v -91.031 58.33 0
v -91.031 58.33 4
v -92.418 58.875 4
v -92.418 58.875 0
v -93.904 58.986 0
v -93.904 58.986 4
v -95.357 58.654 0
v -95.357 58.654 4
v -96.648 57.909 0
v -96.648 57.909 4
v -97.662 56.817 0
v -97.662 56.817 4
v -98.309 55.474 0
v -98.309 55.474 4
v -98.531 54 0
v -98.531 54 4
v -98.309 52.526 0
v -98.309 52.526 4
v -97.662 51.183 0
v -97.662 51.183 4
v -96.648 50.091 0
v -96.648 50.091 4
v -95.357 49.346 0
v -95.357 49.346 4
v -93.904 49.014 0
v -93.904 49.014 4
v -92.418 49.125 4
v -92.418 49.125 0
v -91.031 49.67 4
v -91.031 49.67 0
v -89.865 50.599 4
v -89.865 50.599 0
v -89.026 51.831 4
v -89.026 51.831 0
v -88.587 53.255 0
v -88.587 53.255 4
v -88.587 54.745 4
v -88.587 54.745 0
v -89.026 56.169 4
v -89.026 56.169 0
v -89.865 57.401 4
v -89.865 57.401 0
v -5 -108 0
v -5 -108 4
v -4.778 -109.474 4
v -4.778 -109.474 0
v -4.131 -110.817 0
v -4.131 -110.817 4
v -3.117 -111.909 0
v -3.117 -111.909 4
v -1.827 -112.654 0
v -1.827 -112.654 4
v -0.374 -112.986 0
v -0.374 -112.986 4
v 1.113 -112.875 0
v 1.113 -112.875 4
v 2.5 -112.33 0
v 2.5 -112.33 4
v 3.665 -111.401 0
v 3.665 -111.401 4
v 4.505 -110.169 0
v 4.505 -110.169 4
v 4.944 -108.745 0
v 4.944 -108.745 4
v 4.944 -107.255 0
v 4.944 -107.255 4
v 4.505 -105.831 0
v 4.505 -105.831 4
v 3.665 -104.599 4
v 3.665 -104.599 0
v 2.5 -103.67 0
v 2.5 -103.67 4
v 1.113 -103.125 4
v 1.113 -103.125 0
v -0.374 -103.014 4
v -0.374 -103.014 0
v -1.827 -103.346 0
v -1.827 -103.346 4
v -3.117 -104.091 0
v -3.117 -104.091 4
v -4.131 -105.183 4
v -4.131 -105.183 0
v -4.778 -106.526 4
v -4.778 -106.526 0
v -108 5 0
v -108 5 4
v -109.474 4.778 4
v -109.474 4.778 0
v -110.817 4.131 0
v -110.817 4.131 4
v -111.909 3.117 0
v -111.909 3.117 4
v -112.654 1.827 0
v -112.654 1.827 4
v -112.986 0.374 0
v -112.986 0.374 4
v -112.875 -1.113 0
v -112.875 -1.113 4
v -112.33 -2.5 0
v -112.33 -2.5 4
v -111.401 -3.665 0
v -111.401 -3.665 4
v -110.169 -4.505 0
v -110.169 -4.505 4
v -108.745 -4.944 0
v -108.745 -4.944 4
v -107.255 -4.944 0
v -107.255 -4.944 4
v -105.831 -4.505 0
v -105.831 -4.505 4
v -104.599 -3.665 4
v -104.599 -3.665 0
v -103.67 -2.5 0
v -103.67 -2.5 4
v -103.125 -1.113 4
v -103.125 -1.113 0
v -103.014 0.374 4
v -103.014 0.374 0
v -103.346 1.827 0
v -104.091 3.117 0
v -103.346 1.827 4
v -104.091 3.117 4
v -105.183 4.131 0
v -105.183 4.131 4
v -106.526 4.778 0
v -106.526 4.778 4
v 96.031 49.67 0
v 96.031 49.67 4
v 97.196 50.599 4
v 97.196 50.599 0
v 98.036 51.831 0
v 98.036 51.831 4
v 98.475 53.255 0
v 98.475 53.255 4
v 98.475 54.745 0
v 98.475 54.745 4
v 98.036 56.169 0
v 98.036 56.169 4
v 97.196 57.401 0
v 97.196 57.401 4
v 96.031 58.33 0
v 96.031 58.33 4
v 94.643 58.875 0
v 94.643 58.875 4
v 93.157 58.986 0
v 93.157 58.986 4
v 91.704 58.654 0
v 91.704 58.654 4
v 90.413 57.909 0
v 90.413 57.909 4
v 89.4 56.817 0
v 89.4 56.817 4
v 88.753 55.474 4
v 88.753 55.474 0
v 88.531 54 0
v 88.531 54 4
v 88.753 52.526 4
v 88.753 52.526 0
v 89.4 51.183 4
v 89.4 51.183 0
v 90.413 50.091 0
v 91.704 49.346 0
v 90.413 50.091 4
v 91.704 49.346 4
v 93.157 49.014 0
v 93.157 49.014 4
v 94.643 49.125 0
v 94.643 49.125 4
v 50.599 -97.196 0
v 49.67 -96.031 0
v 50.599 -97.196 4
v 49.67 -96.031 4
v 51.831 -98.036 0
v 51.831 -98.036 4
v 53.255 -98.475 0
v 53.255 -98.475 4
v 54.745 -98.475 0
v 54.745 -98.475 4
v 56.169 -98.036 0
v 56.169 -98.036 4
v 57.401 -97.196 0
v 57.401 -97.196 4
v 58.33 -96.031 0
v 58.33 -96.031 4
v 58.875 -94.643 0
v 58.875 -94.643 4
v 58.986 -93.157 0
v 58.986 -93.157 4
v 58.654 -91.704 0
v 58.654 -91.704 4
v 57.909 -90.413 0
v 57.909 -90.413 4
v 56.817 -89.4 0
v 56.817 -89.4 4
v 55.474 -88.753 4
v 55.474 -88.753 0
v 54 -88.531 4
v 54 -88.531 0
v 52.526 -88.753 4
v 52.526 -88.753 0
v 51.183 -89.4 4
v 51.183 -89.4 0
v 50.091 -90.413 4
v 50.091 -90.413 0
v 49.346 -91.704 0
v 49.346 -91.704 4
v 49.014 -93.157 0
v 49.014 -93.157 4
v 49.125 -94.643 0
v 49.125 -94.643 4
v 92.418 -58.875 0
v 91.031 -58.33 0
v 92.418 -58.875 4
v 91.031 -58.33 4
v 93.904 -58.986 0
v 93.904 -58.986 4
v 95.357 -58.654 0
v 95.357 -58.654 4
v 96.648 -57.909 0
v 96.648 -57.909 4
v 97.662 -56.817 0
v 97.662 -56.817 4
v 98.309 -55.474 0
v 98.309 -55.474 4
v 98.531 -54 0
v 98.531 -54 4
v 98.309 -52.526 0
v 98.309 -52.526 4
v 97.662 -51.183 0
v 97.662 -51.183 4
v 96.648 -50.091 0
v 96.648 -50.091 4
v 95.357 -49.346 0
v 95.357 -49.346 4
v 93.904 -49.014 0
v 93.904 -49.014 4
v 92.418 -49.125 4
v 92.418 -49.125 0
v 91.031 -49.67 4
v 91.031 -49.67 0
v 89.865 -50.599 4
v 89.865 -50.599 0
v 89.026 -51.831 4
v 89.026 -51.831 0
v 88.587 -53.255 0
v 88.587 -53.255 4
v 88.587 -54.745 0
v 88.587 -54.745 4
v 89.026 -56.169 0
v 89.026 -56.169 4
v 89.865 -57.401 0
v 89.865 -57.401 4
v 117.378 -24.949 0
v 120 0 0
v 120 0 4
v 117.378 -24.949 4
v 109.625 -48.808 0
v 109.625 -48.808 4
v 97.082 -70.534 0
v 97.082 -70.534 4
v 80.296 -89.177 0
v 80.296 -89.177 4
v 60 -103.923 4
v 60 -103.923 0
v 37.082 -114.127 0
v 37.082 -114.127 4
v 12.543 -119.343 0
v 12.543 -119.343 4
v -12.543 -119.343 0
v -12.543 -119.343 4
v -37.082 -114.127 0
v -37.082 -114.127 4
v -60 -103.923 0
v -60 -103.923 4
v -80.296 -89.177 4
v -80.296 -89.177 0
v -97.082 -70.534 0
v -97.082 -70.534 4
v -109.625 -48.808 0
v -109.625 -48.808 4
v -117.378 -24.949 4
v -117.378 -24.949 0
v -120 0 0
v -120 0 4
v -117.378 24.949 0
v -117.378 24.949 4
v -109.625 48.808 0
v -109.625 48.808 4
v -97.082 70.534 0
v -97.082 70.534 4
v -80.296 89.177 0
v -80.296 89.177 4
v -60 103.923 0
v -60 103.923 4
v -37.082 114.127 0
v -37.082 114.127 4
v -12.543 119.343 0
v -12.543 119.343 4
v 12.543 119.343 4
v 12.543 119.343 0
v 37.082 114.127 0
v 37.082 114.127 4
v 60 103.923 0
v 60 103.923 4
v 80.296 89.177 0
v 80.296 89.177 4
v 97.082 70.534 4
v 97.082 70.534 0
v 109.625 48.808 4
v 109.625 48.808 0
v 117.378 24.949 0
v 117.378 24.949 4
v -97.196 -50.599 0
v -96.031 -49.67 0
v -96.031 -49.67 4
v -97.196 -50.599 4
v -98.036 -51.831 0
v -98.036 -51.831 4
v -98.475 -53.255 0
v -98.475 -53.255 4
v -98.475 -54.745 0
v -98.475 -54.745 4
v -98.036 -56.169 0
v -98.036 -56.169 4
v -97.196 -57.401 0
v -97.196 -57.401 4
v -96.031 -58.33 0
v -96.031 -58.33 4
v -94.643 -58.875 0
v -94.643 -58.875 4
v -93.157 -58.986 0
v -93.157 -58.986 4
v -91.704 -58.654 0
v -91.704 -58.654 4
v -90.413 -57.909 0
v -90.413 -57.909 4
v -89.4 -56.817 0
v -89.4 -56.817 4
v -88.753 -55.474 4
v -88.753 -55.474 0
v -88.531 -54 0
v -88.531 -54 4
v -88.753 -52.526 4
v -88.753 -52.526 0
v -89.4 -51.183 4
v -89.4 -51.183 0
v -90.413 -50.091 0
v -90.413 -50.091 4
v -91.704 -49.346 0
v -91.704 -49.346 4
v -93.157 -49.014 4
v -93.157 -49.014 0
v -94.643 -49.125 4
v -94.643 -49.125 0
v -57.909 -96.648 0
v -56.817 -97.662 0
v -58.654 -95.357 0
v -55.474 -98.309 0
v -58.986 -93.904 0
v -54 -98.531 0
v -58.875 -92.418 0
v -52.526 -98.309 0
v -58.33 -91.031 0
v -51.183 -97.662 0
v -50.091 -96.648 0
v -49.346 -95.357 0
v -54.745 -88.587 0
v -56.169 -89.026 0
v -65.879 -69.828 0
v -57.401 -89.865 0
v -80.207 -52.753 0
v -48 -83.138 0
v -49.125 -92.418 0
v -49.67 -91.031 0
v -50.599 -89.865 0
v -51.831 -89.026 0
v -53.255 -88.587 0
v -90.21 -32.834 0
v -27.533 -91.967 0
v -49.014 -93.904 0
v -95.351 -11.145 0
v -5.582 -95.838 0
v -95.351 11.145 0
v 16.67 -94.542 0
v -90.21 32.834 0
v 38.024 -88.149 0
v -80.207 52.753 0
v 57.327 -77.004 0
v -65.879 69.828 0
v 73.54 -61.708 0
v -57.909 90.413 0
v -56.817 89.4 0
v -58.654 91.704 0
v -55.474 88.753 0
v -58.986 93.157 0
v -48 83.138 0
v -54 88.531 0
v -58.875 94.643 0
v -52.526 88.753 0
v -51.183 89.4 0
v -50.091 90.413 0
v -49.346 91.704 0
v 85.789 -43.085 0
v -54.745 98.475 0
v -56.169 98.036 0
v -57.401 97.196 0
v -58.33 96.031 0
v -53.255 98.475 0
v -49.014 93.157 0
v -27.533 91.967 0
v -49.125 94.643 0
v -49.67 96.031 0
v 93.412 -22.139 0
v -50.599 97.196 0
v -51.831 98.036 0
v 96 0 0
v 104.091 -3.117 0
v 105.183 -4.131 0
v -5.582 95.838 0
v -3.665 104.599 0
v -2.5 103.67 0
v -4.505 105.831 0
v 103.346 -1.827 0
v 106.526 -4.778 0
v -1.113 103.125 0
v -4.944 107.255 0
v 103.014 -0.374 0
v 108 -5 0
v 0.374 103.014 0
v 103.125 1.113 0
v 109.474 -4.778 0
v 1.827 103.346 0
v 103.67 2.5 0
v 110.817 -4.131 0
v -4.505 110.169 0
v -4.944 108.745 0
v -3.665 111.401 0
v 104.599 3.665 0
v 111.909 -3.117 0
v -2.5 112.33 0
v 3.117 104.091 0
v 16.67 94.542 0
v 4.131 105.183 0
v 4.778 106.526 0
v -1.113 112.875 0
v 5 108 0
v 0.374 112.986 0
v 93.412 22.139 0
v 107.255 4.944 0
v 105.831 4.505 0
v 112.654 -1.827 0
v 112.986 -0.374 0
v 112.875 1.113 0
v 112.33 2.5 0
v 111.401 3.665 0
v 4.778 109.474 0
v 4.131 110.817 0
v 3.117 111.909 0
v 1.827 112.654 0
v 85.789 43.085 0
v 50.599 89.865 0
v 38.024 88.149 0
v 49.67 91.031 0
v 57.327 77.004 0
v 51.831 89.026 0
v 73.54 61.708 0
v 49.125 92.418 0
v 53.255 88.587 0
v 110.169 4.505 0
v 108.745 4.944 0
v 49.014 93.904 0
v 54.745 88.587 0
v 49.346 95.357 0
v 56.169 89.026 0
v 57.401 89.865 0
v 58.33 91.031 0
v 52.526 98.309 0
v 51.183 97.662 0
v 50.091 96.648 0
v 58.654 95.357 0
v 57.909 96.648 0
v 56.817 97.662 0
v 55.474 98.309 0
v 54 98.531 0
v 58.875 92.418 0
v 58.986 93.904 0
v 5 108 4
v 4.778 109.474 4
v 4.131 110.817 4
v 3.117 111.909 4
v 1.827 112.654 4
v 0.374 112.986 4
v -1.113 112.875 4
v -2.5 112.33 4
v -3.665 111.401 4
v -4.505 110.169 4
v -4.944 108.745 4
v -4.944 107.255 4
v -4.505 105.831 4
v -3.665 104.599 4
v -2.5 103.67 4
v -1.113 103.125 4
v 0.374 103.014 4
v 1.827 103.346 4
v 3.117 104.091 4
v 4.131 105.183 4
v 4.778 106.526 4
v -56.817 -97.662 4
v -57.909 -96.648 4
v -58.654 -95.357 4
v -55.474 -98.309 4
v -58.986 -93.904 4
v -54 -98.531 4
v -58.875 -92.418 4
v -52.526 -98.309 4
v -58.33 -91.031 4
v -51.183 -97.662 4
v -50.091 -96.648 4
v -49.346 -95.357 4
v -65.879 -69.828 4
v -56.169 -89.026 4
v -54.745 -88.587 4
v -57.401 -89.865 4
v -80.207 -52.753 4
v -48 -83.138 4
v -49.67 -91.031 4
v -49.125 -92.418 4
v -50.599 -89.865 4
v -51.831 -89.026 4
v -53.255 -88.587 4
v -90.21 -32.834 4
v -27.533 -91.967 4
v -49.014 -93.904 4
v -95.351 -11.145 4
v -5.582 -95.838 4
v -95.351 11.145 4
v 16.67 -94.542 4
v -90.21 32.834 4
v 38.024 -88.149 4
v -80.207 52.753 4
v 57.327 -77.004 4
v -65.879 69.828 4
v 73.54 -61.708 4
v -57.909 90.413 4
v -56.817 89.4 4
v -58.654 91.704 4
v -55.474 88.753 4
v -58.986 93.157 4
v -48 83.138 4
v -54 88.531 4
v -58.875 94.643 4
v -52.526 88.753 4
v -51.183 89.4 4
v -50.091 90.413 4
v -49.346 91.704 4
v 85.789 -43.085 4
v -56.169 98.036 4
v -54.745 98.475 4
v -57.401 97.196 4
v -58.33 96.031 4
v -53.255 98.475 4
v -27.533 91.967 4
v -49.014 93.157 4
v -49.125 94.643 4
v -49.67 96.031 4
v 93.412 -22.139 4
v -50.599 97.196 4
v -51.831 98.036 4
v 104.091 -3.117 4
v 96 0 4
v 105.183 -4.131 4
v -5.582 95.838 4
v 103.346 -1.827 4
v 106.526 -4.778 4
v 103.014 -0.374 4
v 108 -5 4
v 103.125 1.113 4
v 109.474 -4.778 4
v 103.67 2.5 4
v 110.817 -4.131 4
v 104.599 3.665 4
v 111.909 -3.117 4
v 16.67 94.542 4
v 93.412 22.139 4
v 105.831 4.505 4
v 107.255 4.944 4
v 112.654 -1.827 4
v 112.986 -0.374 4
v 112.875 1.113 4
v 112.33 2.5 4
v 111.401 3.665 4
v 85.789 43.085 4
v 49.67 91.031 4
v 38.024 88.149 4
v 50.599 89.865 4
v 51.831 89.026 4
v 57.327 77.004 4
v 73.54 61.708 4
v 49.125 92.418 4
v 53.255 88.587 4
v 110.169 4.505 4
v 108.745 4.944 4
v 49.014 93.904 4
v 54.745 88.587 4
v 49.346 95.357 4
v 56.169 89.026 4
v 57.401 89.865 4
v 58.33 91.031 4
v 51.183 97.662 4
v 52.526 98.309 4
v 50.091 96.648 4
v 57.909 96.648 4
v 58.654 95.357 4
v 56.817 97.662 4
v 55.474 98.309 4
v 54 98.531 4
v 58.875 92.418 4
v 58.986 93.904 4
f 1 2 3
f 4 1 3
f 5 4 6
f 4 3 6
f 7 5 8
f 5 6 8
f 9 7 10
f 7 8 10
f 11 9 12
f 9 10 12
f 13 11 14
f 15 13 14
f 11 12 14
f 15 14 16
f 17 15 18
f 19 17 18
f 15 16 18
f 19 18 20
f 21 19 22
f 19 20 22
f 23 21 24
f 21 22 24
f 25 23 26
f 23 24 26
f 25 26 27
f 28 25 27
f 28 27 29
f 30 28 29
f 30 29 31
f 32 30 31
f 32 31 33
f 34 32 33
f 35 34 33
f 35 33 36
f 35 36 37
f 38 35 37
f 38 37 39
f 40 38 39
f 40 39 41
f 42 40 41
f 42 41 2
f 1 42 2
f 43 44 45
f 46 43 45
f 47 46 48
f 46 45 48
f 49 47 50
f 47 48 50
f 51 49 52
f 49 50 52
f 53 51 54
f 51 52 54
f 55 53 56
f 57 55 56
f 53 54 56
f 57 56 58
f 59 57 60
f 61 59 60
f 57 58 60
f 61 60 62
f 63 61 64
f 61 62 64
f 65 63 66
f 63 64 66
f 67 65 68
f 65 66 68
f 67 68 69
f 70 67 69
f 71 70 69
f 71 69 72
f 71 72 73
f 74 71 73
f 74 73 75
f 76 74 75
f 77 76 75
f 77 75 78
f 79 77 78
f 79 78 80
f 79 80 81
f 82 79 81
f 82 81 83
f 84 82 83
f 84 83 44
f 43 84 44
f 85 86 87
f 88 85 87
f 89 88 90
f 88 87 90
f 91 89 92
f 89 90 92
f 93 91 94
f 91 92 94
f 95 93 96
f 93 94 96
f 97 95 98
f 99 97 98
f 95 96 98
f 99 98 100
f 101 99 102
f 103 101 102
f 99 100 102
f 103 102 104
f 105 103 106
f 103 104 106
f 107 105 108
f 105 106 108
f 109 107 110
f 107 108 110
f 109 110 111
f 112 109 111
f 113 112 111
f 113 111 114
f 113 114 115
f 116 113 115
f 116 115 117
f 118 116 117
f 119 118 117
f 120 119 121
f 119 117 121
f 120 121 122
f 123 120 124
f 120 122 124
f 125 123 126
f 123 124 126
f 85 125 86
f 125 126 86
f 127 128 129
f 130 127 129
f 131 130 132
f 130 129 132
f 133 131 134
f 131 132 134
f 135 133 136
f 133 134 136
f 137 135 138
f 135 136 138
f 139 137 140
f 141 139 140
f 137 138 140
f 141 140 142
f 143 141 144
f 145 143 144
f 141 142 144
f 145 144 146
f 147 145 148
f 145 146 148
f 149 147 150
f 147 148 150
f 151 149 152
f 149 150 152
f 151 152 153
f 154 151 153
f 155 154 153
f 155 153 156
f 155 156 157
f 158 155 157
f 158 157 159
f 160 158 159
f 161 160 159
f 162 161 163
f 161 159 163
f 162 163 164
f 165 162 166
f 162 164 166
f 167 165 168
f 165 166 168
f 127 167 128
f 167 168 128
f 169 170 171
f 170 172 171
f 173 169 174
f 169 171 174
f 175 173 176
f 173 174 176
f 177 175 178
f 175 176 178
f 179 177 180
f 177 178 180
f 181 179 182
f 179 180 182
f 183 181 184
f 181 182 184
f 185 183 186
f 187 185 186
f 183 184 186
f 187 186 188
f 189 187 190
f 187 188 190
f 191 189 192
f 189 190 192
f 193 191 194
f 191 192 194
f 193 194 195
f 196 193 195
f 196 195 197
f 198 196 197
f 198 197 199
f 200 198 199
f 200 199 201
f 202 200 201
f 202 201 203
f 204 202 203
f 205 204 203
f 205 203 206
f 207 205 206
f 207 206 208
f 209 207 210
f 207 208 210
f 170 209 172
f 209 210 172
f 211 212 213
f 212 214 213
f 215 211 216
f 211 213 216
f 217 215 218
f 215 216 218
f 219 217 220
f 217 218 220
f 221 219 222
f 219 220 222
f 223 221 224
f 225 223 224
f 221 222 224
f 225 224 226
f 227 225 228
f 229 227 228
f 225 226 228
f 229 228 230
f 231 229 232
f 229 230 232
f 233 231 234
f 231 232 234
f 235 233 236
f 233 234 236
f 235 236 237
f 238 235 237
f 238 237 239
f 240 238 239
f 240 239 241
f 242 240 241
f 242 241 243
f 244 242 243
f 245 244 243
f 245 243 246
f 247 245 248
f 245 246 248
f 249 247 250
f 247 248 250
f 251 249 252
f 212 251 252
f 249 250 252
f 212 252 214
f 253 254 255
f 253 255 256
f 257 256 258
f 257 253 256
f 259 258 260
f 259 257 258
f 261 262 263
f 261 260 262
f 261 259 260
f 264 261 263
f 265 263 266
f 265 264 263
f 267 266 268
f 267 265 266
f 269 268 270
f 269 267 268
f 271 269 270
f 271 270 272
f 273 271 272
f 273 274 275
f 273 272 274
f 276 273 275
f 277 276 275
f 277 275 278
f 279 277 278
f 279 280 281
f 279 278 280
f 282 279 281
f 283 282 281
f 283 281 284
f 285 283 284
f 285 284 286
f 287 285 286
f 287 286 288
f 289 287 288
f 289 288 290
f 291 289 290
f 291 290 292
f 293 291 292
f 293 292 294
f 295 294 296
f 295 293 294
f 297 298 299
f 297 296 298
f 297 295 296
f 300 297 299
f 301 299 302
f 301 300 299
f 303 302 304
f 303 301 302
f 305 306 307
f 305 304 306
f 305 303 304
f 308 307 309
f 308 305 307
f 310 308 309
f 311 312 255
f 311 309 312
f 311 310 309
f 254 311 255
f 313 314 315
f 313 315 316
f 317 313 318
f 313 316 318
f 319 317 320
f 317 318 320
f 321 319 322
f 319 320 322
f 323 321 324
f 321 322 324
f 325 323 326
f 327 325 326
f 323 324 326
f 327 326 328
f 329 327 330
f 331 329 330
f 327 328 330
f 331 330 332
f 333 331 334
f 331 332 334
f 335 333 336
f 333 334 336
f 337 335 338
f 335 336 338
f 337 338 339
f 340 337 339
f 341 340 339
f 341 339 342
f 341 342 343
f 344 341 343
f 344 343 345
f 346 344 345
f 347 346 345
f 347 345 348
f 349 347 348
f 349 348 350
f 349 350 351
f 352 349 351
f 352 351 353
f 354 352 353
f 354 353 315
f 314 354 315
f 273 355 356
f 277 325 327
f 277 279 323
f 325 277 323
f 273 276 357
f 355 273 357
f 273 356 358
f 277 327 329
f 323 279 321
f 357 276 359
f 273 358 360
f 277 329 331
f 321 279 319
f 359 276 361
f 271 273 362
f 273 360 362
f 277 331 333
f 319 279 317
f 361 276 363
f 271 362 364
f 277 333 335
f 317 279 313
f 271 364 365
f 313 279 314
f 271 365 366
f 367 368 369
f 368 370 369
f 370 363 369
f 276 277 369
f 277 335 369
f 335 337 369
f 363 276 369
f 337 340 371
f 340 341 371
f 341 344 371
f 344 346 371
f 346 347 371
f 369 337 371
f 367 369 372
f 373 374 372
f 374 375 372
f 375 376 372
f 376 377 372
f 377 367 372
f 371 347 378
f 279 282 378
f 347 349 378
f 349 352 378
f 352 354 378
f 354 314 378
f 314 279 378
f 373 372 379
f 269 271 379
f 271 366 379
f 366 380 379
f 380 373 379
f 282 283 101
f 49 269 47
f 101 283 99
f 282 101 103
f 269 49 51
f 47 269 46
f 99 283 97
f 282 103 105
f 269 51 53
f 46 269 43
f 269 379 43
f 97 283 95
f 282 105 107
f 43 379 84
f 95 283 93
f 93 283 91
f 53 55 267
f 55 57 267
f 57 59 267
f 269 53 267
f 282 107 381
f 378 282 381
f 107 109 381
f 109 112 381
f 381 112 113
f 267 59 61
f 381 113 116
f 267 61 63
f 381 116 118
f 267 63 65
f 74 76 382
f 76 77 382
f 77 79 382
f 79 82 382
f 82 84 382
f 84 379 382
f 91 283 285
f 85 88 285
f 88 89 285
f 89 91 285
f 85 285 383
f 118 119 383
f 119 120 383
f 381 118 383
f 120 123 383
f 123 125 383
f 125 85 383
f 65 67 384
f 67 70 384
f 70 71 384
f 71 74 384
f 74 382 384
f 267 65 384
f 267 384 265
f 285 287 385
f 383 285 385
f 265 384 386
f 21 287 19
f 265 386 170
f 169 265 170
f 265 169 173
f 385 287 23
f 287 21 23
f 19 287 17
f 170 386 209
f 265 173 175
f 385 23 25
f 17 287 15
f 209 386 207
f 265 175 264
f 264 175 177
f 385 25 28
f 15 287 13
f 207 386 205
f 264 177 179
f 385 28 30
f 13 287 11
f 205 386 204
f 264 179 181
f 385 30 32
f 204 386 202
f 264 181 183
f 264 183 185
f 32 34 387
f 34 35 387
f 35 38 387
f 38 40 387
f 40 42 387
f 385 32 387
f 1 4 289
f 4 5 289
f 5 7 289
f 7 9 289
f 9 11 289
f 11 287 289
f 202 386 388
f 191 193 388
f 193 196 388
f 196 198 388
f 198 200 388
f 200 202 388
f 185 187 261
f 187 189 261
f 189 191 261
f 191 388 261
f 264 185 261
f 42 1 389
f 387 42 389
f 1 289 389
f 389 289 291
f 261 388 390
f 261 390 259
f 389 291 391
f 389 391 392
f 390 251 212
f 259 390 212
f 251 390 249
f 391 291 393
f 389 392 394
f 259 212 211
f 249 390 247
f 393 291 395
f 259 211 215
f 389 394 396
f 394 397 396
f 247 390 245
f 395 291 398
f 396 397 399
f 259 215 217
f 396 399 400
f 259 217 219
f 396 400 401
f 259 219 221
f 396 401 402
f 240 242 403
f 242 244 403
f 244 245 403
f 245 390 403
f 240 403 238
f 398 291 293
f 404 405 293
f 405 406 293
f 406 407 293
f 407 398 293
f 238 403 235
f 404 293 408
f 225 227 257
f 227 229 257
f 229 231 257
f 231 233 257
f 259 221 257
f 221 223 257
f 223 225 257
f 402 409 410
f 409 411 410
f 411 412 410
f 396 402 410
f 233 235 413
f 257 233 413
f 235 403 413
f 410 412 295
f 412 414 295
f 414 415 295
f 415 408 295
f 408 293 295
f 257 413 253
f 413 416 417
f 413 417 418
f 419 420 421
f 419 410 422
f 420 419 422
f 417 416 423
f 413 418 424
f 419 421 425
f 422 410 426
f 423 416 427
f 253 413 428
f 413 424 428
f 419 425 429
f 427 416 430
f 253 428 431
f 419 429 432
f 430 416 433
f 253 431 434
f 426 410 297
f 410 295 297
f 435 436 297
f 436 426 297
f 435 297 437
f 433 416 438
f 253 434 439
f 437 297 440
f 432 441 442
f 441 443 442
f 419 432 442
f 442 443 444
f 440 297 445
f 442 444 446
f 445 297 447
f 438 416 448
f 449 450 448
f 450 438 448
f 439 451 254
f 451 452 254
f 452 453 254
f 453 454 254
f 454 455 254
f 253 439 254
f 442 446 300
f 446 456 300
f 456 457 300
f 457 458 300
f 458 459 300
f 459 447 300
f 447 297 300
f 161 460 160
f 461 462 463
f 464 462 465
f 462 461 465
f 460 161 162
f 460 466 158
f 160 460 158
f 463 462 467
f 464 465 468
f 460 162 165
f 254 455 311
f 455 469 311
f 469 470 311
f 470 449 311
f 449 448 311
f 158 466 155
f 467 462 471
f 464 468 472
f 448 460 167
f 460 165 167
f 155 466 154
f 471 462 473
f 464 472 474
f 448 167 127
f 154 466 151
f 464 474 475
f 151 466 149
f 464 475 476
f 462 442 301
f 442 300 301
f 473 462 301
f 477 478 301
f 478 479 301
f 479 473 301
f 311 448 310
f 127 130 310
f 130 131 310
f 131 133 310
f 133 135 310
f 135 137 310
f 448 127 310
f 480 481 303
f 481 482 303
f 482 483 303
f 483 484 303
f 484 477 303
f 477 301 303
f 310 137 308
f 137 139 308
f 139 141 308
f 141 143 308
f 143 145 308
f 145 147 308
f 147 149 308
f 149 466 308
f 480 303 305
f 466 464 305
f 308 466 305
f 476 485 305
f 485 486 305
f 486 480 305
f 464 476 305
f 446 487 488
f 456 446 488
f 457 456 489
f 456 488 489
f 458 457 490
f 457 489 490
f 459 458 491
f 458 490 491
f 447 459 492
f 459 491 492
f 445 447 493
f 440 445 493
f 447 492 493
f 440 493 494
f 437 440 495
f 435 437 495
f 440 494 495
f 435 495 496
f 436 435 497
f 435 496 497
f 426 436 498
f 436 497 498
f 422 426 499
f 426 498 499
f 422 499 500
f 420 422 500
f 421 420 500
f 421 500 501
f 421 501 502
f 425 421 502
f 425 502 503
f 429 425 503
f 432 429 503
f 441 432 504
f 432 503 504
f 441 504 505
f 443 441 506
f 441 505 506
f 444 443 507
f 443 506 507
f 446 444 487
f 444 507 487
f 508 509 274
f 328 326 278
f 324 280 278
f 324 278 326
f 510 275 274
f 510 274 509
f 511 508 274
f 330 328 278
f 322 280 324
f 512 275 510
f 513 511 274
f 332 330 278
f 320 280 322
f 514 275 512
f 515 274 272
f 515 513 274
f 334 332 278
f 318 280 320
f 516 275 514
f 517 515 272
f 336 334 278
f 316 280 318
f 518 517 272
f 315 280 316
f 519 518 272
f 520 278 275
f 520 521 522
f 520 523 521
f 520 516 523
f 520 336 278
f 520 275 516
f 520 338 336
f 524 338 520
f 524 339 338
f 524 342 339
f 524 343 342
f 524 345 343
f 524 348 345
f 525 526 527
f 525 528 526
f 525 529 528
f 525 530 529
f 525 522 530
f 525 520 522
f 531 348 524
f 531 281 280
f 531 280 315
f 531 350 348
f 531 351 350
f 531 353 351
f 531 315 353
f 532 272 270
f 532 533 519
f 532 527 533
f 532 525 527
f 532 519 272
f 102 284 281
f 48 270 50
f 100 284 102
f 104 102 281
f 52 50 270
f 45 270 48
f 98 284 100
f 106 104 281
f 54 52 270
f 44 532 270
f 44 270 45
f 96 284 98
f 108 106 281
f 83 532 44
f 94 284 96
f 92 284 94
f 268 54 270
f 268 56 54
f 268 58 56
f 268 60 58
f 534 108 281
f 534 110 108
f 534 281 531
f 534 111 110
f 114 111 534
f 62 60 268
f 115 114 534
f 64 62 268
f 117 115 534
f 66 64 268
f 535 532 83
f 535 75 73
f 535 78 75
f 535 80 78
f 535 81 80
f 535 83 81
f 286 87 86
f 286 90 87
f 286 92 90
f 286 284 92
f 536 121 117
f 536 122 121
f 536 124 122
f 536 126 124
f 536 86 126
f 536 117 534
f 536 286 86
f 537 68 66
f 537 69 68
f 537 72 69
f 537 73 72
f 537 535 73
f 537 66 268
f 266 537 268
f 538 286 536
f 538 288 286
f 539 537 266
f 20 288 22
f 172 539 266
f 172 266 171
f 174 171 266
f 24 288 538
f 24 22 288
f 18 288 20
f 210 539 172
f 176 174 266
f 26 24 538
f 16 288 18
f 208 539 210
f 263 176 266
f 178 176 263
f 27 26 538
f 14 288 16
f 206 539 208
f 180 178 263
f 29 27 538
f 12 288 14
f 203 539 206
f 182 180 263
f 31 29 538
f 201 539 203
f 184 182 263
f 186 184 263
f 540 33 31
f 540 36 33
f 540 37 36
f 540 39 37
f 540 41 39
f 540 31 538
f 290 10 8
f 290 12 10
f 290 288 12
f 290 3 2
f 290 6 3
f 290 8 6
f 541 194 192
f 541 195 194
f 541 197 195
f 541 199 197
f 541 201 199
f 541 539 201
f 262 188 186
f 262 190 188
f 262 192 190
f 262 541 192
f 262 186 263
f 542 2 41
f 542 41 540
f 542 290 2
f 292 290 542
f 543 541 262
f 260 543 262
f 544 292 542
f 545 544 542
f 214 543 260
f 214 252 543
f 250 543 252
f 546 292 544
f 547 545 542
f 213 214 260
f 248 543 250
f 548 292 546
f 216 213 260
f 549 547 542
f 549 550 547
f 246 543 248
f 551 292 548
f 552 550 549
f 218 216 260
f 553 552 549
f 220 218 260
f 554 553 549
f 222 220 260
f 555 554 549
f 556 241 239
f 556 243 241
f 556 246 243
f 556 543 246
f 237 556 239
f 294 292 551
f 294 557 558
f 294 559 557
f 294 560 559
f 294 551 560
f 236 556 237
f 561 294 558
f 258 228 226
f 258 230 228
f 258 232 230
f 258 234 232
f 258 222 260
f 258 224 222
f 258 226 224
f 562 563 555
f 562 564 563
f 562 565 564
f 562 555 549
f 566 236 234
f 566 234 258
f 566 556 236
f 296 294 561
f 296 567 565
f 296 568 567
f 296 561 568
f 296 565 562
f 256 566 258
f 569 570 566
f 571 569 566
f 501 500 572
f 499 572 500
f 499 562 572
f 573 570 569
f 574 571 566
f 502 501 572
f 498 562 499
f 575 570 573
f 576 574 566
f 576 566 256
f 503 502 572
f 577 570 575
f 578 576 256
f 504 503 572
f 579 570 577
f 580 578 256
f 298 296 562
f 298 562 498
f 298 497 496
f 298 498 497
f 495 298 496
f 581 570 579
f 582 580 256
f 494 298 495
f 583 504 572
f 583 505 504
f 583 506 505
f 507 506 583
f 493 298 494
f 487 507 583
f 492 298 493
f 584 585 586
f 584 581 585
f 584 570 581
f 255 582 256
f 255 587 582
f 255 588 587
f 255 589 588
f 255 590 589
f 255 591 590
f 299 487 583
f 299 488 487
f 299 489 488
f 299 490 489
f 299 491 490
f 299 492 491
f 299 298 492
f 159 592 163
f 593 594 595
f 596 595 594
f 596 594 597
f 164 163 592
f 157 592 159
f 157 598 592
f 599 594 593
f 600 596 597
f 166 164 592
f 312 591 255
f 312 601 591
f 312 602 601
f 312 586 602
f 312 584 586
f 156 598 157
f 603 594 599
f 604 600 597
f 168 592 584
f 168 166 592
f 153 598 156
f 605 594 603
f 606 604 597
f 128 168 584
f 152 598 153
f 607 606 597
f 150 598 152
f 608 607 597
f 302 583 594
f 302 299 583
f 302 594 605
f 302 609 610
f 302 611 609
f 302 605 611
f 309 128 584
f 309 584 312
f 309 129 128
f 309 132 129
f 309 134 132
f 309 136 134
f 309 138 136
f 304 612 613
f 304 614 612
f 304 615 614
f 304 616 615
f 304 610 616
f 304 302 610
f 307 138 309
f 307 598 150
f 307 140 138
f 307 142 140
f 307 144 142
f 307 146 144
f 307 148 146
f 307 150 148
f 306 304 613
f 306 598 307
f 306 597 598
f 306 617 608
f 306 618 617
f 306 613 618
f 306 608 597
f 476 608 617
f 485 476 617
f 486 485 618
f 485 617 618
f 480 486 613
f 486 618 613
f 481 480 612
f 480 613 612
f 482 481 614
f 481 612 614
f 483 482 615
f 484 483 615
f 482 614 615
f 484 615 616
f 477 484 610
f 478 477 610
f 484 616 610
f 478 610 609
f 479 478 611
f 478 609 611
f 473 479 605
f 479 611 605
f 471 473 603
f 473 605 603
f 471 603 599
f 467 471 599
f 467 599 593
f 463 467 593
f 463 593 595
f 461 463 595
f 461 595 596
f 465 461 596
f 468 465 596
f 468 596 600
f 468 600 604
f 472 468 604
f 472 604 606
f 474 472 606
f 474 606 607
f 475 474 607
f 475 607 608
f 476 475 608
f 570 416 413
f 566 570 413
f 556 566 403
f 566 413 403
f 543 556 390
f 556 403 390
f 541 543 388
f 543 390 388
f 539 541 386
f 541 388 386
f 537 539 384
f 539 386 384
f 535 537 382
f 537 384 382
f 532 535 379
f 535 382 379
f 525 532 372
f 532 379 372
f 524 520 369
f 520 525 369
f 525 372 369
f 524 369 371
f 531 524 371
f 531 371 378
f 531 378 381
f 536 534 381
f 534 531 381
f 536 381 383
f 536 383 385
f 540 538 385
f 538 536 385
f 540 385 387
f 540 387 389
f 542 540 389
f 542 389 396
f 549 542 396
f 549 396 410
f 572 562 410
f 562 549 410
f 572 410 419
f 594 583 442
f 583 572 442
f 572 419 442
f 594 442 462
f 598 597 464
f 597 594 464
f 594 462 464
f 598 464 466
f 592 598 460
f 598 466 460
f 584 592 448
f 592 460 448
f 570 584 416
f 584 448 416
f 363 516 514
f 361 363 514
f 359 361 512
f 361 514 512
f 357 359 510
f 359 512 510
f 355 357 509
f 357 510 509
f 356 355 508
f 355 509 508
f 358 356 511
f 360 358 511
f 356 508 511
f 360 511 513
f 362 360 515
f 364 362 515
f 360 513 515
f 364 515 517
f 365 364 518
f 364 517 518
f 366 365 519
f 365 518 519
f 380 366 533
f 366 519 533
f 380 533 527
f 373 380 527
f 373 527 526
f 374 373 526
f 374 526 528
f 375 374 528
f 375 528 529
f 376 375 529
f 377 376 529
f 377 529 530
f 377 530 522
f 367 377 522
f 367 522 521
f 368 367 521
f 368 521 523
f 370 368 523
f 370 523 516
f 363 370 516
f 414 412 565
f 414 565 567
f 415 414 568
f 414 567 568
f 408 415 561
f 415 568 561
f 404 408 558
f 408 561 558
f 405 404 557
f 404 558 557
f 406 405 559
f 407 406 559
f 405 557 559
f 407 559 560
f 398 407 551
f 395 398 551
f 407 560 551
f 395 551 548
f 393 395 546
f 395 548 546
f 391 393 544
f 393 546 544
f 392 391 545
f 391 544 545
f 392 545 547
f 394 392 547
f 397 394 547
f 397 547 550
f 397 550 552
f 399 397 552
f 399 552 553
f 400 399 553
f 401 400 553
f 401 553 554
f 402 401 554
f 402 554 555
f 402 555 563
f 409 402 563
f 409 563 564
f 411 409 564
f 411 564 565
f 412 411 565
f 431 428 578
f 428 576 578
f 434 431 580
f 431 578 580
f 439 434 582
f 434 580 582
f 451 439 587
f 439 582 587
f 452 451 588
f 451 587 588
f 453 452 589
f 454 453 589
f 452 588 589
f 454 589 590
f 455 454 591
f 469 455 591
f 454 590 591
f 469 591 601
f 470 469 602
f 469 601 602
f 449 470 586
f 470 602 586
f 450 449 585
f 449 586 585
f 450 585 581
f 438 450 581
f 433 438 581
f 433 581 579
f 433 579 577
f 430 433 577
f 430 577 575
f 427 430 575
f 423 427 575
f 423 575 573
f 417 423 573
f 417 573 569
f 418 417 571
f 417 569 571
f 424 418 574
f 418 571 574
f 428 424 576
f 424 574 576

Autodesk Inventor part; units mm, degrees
ref_plane "YZ Plane" through (0, 0, 0) normal (1, 0, 0) x (0, 1, 0)
ref_plane "XZ Plane" through (0, 0, 0) normal (0, 1, 0) x (-1, 0, 0)
ref_plane "XY Plane" through (0, 0, 0) normal (0, 0, 1) x (1, 0, 0)
sketch "Sketch1" plane through (0, 0, 0) normal (0, 0, 1) x (1, 0, 0)
  circle A0 centre (0, 0) radius 96
  circle A1 centre (0, 0) radius 120
  dimension "d22" = 192
  dimension "d23" = 240
extrude "Plate1" add sketch "Sketch1" along normal blind 4
sketch "Sketch5" plane through (0, 0, 4) normal (0, 0, 1) x (1, 0, 0)
  circle A0 centre (0, 108) radius 5
  circle A1 centre (0, 0) radius 108 construction
  dimension "d25" = 216
  dimension "d24" = 10
extrude "Cut1" cut sketch "Sketch5" against normal blind 4
pattern_circular "Circular Pattern1" count 12 over 360 about axis through (0, 0, 0) along (0, 0, 1) of "Cut1"
equation "\"d26\" = Thickness"
equation "\"d2\" = Thickness"
equation "\"BendReliefWidth\" = Thickness"
equation "\"BendReliefDepth\" = 0.5 * Thickness"
equation "\"CornerReliefSize\" = 4 * Thickness"
equation "\"MinimumRemnant\" = 2 * Thickness"
equation "\"TransitionRadius\" = BendRadius"
equation "\"JacobiRadiusSize\" = BendRadius"
equation "\"GapSize\" = Thickness"
equation "\"Thickness\" = 4"
equation "\"BendRadius\" = 5"
properties part number "TKS 3213 flange ffilter" material "Stainless Steel"
